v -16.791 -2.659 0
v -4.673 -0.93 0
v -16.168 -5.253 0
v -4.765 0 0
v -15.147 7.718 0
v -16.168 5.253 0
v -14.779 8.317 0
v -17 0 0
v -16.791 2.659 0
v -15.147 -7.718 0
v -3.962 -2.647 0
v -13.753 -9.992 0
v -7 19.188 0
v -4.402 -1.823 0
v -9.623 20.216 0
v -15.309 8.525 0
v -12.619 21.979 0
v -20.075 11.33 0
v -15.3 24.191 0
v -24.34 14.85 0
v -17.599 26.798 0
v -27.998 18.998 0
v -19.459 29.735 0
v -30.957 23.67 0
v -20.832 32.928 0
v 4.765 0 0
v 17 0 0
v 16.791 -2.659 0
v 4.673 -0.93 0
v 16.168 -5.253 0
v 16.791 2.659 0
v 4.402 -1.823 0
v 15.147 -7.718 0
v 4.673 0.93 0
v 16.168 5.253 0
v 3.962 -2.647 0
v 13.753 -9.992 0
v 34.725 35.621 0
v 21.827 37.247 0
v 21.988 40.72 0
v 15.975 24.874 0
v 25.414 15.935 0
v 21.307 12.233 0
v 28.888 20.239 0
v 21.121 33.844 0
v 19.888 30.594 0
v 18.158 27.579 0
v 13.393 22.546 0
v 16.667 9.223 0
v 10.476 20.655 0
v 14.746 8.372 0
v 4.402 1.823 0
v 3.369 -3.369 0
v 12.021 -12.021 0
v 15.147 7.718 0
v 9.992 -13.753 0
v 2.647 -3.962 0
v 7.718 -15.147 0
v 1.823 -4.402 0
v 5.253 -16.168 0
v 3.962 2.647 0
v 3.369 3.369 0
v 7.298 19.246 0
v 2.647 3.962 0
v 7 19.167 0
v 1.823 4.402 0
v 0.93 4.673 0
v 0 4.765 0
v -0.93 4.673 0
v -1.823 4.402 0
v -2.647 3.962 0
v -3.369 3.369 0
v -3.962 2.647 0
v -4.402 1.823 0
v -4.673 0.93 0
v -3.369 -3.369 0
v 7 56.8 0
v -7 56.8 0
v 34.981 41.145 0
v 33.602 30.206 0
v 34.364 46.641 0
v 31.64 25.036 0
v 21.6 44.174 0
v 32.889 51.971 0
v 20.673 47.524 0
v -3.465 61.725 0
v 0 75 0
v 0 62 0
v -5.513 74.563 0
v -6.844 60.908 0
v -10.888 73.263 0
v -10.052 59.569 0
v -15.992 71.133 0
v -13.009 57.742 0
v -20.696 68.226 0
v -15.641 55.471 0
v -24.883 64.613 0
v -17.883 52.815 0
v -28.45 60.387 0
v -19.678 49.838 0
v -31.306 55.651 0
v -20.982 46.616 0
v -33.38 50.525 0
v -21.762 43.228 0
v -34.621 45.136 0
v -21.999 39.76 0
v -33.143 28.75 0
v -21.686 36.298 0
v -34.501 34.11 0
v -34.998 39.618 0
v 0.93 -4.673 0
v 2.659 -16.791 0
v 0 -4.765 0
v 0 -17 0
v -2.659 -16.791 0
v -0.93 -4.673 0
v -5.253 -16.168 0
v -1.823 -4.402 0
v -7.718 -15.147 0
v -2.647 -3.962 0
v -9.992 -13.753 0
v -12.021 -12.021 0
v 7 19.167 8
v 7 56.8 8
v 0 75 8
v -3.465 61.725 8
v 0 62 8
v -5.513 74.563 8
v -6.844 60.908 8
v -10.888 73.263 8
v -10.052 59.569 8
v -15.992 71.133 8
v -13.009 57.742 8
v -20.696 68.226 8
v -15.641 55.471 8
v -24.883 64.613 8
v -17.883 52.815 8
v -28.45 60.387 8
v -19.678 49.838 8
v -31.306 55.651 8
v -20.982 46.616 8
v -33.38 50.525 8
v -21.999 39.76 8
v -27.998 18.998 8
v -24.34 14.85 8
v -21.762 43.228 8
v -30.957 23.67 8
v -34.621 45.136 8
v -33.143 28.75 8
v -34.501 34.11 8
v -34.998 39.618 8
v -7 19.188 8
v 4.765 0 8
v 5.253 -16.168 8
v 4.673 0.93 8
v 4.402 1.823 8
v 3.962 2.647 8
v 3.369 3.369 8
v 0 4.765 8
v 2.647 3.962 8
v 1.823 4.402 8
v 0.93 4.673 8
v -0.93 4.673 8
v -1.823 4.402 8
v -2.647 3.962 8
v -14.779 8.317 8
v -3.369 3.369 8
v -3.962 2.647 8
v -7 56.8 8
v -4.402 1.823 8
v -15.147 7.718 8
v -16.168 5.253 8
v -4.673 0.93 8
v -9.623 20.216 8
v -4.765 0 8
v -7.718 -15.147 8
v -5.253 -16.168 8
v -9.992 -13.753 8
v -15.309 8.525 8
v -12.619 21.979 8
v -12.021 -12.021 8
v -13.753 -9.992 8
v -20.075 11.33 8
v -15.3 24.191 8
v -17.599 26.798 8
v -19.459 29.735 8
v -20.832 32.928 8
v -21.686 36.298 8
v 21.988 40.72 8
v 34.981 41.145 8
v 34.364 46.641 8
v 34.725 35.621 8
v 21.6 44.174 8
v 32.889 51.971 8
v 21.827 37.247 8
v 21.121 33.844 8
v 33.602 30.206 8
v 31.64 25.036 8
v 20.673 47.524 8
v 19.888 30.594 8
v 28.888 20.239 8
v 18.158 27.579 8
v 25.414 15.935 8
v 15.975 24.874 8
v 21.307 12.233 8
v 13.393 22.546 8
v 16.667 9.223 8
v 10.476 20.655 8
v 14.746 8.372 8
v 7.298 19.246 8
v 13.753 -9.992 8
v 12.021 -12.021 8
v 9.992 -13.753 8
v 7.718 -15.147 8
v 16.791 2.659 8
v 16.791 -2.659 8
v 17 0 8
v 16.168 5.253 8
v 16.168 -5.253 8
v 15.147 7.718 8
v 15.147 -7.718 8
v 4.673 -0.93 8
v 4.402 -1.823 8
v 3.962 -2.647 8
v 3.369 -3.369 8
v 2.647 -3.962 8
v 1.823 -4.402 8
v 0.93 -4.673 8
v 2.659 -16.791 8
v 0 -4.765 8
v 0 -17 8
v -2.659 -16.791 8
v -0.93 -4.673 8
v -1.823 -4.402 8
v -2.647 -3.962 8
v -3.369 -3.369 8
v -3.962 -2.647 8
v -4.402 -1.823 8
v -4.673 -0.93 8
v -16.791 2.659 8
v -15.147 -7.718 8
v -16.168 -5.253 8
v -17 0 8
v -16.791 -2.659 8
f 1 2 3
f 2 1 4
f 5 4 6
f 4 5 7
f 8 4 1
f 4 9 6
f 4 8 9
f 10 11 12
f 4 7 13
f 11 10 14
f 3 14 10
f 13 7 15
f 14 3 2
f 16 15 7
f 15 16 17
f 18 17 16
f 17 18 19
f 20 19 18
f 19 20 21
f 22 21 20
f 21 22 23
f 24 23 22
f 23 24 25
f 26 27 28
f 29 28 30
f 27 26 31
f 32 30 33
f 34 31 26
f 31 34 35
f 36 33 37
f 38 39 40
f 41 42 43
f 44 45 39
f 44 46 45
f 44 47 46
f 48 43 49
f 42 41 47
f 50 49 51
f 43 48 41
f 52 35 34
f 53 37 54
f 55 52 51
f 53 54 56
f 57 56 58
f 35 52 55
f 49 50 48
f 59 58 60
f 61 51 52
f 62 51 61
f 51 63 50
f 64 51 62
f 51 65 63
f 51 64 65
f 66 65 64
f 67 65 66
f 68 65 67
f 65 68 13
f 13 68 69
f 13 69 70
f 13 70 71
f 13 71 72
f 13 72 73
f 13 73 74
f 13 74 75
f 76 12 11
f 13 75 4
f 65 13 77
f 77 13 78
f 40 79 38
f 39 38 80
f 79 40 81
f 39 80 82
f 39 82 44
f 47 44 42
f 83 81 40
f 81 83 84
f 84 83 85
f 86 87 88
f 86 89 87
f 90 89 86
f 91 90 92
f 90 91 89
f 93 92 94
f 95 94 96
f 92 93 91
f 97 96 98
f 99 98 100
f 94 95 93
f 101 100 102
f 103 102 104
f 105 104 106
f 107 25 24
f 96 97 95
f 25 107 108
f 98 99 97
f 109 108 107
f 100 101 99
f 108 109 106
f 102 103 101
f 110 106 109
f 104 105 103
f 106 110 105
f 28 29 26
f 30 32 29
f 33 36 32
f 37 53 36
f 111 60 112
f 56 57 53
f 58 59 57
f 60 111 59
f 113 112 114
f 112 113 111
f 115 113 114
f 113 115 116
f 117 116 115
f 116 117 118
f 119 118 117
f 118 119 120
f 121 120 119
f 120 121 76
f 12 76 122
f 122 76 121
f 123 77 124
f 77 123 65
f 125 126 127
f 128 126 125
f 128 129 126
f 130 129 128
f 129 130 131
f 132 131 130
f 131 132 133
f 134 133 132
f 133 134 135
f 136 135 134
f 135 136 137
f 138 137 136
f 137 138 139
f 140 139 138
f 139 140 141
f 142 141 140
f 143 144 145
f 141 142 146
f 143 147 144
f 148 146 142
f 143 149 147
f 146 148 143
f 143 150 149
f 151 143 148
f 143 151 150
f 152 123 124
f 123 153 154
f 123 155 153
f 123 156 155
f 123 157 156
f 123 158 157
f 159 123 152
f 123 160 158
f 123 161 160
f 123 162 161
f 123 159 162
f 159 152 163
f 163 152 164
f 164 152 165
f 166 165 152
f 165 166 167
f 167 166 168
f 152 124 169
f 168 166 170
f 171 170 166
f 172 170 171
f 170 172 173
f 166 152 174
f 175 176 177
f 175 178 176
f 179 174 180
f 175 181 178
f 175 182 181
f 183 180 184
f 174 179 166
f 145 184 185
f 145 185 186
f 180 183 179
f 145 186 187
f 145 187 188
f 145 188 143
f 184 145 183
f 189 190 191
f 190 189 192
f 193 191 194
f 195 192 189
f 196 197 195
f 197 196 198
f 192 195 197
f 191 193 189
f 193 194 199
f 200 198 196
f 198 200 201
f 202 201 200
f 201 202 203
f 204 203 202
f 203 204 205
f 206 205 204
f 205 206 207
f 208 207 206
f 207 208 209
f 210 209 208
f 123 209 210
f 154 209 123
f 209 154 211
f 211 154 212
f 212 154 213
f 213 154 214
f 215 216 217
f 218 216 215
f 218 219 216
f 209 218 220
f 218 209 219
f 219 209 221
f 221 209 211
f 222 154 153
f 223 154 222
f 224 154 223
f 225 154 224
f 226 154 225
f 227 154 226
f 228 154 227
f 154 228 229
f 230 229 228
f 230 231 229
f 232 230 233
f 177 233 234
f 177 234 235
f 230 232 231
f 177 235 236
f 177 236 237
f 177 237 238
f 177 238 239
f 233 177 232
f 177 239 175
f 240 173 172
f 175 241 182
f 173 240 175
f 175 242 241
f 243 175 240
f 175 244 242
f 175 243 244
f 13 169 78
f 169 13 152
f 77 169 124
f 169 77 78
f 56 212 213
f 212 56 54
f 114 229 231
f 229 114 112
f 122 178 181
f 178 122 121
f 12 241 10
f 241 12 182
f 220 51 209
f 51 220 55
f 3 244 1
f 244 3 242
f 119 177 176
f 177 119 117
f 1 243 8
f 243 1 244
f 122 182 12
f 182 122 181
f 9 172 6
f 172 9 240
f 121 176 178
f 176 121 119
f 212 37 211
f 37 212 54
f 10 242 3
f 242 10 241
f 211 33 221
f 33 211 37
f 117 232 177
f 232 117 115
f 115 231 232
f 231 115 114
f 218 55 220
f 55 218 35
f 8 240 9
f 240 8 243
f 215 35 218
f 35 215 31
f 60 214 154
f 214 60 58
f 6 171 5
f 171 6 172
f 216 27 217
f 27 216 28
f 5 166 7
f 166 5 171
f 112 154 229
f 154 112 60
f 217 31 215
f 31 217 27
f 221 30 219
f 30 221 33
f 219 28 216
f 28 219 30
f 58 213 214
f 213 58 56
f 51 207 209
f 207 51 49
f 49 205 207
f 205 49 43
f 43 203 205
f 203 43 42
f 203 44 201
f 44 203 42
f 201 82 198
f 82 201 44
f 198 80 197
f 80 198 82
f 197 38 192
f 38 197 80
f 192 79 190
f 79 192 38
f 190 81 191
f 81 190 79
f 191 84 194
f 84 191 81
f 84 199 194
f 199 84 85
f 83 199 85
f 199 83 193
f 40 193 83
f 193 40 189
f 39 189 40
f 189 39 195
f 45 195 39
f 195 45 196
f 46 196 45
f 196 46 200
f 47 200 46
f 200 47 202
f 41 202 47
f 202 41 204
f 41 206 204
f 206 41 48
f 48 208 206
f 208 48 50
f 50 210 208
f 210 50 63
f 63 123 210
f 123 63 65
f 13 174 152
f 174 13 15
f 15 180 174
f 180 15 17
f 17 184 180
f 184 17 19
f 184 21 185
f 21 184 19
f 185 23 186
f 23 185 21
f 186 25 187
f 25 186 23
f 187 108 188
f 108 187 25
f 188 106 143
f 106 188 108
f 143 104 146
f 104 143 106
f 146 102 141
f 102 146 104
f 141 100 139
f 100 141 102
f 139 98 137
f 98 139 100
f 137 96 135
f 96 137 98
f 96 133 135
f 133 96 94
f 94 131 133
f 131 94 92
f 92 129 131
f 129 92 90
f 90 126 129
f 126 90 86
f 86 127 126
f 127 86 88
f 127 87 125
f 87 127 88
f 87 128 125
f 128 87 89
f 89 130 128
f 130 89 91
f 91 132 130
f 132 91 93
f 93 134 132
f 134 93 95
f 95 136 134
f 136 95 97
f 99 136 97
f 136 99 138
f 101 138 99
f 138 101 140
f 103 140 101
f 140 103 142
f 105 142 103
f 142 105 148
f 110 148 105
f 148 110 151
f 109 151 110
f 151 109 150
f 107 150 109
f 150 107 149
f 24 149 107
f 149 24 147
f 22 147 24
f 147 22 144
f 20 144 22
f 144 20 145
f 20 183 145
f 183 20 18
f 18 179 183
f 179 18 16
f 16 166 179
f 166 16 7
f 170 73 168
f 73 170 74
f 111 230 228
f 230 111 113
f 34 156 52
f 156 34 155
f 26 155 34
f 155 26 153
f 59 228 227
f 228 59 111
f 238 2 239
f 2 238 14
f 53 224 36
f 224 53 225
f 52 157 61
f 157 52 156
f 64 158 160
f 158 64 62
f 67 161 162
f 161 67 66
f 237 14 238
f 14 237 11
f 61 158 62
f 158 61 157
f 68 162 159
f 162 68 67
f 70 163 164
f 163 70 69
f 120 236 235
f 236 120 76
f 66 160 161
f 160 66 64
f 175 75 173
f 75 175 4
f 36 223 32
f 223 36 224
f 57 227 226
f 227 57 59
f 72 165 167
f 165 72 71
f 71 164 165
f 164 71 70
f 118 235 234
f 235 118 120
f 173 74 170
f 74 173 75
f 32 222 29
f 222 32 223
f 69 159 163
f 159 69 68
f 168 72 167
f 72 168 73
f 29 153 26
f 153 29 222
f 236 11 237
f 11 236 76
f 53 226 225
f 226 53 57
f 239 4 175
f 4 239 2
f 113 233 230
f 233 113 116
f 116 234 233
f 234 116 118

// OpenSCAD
$fn = 32;

// ----------------------------------------------------------------------
// Hook: 80 mm shank into a 22 mm curl, 8 mm thick
// ----------------------------------------------------------------------

// --- parameters (mm) ---
shank_len = 80;           // shank length from the boss centre
shank_w = 14;             // shank width
boss_d = 34;              // boss diameter
bore_d = 9.53;            // boss bore
curl_in = 22;             // curl inner radius
curl_out = 35;            // curl outer radius
curl_sweep = 290;         // curl sweep angle
hook_t = 8;               // hook thickness

shank_profile = [[-7, 56.8], [7, 56.8], [7, 15], [-7, 15]];
boss_profile = [[17, 0], [16.791, 2.659], [16.168, 5.253], [15.147, 7.718], [13.753, 9.992], [12.021, 12.021], [9.992, 13.753], [7.718, 15.147], [5.253, 16.168], [2.659, 16.791], [0, 17], [-2.659, 16.791], [-5.253, 16.168], [-7.718, 15.147], [-9.992, 13.753], [-12.021, 12.021], [-13.753, 9.992], [-15.147, 7.718], [-16.168, 5.253], [-16.791, 2.659], [-17, 0], [-16.791, -2.659], [-16.168, -5.253], [-15.147, -7.718], [-13.753, -9.992], [-12.021, -12.021], [-9.992, -13.753], [-7.718, -15.147], [-5.253, -16.168], [-2.659, -16.791], [0, -17], [2.659, -16.791], [5.253, -16.168], [7.718, -15.147], [9.992, -13.753], [12.021, -12.021], [13.753, -9.992], [15.147, -7.718], [16.168, -5.253], [16.791, -2.659]];
curl_profile = [[0, 75], [-5.513, 74.563], [-10.888, 73.263], [-15.992, 71.133], [-20.696, 68.226], [-24.883, 64.613], [-28.45, 60.387], [-31.306, 55.651], [-33.38, 50.525], [-34.621, 45.136], [-34.998, 39.618], [-34.501, 34.11], [-33.143, 28.75], [-30.957, 23.67], [-27.998, 18.998], [-24.34, 14.85], [-20.075, 11.33], [-15.309, 8.525], [-10.16, 6.507], [-4.758, 5.325], [0.764, 5.008], [6.266, 5.565], [11.611, 6.982], [16.667, 9.223], [21.307, 12.233], [25.414, 15.935], [28.888, 20.239], [31.64, 25.036], [33.602, 30.206], [34.725, 35.621], [34.981, 41.145], [34.364, 46.641], [32.889, 51.971], [20.673, 47.524], [21.6, 44.174], [21.988, 40.72], [21.827, 37.247], [21.121, 33.844], [19.888, 30.594], [18.158, 27.579], [15.975, 24.874], [13.393, 22.546], [10.476, 20.655], [7.298, 19.246], [3.938, 18.355], [0.48, 18.005], [-2.99, 18.204], [-6.386, 18.947], [-9.623, 20.216], [-12.619, 21.979], [-15.3, 24.191], [-17.599, 26.798], [-19.459, 29.735], [-20.832, 32.928], [-21.686, 36.298], [-21.999, 39.76], [-21.762, 43.228], [-20.982, 46.616], [-19.678, 49.838], [-17.883, 52.815], [-15.641, 55.471], [-13.009, 57.742], [-10.052, 59.569], [-6.844, 60.908], [-3.465, 61.725], [0, 62]];

difference() {
  union() {
    /* three overlapping outlines: shank, boss and the smooth curl */
    linear_extrude(height = hook_t) polygon(shank_profile);
    linear_extrude(height = hook_t) polygon(boss_profile);
    linear_extrude(height = hook_t) polygon(curl_profile);
  }
  translate([0, 0, -2.5]) cylinder(h = hook_t + 5, d = bore_d);
}
